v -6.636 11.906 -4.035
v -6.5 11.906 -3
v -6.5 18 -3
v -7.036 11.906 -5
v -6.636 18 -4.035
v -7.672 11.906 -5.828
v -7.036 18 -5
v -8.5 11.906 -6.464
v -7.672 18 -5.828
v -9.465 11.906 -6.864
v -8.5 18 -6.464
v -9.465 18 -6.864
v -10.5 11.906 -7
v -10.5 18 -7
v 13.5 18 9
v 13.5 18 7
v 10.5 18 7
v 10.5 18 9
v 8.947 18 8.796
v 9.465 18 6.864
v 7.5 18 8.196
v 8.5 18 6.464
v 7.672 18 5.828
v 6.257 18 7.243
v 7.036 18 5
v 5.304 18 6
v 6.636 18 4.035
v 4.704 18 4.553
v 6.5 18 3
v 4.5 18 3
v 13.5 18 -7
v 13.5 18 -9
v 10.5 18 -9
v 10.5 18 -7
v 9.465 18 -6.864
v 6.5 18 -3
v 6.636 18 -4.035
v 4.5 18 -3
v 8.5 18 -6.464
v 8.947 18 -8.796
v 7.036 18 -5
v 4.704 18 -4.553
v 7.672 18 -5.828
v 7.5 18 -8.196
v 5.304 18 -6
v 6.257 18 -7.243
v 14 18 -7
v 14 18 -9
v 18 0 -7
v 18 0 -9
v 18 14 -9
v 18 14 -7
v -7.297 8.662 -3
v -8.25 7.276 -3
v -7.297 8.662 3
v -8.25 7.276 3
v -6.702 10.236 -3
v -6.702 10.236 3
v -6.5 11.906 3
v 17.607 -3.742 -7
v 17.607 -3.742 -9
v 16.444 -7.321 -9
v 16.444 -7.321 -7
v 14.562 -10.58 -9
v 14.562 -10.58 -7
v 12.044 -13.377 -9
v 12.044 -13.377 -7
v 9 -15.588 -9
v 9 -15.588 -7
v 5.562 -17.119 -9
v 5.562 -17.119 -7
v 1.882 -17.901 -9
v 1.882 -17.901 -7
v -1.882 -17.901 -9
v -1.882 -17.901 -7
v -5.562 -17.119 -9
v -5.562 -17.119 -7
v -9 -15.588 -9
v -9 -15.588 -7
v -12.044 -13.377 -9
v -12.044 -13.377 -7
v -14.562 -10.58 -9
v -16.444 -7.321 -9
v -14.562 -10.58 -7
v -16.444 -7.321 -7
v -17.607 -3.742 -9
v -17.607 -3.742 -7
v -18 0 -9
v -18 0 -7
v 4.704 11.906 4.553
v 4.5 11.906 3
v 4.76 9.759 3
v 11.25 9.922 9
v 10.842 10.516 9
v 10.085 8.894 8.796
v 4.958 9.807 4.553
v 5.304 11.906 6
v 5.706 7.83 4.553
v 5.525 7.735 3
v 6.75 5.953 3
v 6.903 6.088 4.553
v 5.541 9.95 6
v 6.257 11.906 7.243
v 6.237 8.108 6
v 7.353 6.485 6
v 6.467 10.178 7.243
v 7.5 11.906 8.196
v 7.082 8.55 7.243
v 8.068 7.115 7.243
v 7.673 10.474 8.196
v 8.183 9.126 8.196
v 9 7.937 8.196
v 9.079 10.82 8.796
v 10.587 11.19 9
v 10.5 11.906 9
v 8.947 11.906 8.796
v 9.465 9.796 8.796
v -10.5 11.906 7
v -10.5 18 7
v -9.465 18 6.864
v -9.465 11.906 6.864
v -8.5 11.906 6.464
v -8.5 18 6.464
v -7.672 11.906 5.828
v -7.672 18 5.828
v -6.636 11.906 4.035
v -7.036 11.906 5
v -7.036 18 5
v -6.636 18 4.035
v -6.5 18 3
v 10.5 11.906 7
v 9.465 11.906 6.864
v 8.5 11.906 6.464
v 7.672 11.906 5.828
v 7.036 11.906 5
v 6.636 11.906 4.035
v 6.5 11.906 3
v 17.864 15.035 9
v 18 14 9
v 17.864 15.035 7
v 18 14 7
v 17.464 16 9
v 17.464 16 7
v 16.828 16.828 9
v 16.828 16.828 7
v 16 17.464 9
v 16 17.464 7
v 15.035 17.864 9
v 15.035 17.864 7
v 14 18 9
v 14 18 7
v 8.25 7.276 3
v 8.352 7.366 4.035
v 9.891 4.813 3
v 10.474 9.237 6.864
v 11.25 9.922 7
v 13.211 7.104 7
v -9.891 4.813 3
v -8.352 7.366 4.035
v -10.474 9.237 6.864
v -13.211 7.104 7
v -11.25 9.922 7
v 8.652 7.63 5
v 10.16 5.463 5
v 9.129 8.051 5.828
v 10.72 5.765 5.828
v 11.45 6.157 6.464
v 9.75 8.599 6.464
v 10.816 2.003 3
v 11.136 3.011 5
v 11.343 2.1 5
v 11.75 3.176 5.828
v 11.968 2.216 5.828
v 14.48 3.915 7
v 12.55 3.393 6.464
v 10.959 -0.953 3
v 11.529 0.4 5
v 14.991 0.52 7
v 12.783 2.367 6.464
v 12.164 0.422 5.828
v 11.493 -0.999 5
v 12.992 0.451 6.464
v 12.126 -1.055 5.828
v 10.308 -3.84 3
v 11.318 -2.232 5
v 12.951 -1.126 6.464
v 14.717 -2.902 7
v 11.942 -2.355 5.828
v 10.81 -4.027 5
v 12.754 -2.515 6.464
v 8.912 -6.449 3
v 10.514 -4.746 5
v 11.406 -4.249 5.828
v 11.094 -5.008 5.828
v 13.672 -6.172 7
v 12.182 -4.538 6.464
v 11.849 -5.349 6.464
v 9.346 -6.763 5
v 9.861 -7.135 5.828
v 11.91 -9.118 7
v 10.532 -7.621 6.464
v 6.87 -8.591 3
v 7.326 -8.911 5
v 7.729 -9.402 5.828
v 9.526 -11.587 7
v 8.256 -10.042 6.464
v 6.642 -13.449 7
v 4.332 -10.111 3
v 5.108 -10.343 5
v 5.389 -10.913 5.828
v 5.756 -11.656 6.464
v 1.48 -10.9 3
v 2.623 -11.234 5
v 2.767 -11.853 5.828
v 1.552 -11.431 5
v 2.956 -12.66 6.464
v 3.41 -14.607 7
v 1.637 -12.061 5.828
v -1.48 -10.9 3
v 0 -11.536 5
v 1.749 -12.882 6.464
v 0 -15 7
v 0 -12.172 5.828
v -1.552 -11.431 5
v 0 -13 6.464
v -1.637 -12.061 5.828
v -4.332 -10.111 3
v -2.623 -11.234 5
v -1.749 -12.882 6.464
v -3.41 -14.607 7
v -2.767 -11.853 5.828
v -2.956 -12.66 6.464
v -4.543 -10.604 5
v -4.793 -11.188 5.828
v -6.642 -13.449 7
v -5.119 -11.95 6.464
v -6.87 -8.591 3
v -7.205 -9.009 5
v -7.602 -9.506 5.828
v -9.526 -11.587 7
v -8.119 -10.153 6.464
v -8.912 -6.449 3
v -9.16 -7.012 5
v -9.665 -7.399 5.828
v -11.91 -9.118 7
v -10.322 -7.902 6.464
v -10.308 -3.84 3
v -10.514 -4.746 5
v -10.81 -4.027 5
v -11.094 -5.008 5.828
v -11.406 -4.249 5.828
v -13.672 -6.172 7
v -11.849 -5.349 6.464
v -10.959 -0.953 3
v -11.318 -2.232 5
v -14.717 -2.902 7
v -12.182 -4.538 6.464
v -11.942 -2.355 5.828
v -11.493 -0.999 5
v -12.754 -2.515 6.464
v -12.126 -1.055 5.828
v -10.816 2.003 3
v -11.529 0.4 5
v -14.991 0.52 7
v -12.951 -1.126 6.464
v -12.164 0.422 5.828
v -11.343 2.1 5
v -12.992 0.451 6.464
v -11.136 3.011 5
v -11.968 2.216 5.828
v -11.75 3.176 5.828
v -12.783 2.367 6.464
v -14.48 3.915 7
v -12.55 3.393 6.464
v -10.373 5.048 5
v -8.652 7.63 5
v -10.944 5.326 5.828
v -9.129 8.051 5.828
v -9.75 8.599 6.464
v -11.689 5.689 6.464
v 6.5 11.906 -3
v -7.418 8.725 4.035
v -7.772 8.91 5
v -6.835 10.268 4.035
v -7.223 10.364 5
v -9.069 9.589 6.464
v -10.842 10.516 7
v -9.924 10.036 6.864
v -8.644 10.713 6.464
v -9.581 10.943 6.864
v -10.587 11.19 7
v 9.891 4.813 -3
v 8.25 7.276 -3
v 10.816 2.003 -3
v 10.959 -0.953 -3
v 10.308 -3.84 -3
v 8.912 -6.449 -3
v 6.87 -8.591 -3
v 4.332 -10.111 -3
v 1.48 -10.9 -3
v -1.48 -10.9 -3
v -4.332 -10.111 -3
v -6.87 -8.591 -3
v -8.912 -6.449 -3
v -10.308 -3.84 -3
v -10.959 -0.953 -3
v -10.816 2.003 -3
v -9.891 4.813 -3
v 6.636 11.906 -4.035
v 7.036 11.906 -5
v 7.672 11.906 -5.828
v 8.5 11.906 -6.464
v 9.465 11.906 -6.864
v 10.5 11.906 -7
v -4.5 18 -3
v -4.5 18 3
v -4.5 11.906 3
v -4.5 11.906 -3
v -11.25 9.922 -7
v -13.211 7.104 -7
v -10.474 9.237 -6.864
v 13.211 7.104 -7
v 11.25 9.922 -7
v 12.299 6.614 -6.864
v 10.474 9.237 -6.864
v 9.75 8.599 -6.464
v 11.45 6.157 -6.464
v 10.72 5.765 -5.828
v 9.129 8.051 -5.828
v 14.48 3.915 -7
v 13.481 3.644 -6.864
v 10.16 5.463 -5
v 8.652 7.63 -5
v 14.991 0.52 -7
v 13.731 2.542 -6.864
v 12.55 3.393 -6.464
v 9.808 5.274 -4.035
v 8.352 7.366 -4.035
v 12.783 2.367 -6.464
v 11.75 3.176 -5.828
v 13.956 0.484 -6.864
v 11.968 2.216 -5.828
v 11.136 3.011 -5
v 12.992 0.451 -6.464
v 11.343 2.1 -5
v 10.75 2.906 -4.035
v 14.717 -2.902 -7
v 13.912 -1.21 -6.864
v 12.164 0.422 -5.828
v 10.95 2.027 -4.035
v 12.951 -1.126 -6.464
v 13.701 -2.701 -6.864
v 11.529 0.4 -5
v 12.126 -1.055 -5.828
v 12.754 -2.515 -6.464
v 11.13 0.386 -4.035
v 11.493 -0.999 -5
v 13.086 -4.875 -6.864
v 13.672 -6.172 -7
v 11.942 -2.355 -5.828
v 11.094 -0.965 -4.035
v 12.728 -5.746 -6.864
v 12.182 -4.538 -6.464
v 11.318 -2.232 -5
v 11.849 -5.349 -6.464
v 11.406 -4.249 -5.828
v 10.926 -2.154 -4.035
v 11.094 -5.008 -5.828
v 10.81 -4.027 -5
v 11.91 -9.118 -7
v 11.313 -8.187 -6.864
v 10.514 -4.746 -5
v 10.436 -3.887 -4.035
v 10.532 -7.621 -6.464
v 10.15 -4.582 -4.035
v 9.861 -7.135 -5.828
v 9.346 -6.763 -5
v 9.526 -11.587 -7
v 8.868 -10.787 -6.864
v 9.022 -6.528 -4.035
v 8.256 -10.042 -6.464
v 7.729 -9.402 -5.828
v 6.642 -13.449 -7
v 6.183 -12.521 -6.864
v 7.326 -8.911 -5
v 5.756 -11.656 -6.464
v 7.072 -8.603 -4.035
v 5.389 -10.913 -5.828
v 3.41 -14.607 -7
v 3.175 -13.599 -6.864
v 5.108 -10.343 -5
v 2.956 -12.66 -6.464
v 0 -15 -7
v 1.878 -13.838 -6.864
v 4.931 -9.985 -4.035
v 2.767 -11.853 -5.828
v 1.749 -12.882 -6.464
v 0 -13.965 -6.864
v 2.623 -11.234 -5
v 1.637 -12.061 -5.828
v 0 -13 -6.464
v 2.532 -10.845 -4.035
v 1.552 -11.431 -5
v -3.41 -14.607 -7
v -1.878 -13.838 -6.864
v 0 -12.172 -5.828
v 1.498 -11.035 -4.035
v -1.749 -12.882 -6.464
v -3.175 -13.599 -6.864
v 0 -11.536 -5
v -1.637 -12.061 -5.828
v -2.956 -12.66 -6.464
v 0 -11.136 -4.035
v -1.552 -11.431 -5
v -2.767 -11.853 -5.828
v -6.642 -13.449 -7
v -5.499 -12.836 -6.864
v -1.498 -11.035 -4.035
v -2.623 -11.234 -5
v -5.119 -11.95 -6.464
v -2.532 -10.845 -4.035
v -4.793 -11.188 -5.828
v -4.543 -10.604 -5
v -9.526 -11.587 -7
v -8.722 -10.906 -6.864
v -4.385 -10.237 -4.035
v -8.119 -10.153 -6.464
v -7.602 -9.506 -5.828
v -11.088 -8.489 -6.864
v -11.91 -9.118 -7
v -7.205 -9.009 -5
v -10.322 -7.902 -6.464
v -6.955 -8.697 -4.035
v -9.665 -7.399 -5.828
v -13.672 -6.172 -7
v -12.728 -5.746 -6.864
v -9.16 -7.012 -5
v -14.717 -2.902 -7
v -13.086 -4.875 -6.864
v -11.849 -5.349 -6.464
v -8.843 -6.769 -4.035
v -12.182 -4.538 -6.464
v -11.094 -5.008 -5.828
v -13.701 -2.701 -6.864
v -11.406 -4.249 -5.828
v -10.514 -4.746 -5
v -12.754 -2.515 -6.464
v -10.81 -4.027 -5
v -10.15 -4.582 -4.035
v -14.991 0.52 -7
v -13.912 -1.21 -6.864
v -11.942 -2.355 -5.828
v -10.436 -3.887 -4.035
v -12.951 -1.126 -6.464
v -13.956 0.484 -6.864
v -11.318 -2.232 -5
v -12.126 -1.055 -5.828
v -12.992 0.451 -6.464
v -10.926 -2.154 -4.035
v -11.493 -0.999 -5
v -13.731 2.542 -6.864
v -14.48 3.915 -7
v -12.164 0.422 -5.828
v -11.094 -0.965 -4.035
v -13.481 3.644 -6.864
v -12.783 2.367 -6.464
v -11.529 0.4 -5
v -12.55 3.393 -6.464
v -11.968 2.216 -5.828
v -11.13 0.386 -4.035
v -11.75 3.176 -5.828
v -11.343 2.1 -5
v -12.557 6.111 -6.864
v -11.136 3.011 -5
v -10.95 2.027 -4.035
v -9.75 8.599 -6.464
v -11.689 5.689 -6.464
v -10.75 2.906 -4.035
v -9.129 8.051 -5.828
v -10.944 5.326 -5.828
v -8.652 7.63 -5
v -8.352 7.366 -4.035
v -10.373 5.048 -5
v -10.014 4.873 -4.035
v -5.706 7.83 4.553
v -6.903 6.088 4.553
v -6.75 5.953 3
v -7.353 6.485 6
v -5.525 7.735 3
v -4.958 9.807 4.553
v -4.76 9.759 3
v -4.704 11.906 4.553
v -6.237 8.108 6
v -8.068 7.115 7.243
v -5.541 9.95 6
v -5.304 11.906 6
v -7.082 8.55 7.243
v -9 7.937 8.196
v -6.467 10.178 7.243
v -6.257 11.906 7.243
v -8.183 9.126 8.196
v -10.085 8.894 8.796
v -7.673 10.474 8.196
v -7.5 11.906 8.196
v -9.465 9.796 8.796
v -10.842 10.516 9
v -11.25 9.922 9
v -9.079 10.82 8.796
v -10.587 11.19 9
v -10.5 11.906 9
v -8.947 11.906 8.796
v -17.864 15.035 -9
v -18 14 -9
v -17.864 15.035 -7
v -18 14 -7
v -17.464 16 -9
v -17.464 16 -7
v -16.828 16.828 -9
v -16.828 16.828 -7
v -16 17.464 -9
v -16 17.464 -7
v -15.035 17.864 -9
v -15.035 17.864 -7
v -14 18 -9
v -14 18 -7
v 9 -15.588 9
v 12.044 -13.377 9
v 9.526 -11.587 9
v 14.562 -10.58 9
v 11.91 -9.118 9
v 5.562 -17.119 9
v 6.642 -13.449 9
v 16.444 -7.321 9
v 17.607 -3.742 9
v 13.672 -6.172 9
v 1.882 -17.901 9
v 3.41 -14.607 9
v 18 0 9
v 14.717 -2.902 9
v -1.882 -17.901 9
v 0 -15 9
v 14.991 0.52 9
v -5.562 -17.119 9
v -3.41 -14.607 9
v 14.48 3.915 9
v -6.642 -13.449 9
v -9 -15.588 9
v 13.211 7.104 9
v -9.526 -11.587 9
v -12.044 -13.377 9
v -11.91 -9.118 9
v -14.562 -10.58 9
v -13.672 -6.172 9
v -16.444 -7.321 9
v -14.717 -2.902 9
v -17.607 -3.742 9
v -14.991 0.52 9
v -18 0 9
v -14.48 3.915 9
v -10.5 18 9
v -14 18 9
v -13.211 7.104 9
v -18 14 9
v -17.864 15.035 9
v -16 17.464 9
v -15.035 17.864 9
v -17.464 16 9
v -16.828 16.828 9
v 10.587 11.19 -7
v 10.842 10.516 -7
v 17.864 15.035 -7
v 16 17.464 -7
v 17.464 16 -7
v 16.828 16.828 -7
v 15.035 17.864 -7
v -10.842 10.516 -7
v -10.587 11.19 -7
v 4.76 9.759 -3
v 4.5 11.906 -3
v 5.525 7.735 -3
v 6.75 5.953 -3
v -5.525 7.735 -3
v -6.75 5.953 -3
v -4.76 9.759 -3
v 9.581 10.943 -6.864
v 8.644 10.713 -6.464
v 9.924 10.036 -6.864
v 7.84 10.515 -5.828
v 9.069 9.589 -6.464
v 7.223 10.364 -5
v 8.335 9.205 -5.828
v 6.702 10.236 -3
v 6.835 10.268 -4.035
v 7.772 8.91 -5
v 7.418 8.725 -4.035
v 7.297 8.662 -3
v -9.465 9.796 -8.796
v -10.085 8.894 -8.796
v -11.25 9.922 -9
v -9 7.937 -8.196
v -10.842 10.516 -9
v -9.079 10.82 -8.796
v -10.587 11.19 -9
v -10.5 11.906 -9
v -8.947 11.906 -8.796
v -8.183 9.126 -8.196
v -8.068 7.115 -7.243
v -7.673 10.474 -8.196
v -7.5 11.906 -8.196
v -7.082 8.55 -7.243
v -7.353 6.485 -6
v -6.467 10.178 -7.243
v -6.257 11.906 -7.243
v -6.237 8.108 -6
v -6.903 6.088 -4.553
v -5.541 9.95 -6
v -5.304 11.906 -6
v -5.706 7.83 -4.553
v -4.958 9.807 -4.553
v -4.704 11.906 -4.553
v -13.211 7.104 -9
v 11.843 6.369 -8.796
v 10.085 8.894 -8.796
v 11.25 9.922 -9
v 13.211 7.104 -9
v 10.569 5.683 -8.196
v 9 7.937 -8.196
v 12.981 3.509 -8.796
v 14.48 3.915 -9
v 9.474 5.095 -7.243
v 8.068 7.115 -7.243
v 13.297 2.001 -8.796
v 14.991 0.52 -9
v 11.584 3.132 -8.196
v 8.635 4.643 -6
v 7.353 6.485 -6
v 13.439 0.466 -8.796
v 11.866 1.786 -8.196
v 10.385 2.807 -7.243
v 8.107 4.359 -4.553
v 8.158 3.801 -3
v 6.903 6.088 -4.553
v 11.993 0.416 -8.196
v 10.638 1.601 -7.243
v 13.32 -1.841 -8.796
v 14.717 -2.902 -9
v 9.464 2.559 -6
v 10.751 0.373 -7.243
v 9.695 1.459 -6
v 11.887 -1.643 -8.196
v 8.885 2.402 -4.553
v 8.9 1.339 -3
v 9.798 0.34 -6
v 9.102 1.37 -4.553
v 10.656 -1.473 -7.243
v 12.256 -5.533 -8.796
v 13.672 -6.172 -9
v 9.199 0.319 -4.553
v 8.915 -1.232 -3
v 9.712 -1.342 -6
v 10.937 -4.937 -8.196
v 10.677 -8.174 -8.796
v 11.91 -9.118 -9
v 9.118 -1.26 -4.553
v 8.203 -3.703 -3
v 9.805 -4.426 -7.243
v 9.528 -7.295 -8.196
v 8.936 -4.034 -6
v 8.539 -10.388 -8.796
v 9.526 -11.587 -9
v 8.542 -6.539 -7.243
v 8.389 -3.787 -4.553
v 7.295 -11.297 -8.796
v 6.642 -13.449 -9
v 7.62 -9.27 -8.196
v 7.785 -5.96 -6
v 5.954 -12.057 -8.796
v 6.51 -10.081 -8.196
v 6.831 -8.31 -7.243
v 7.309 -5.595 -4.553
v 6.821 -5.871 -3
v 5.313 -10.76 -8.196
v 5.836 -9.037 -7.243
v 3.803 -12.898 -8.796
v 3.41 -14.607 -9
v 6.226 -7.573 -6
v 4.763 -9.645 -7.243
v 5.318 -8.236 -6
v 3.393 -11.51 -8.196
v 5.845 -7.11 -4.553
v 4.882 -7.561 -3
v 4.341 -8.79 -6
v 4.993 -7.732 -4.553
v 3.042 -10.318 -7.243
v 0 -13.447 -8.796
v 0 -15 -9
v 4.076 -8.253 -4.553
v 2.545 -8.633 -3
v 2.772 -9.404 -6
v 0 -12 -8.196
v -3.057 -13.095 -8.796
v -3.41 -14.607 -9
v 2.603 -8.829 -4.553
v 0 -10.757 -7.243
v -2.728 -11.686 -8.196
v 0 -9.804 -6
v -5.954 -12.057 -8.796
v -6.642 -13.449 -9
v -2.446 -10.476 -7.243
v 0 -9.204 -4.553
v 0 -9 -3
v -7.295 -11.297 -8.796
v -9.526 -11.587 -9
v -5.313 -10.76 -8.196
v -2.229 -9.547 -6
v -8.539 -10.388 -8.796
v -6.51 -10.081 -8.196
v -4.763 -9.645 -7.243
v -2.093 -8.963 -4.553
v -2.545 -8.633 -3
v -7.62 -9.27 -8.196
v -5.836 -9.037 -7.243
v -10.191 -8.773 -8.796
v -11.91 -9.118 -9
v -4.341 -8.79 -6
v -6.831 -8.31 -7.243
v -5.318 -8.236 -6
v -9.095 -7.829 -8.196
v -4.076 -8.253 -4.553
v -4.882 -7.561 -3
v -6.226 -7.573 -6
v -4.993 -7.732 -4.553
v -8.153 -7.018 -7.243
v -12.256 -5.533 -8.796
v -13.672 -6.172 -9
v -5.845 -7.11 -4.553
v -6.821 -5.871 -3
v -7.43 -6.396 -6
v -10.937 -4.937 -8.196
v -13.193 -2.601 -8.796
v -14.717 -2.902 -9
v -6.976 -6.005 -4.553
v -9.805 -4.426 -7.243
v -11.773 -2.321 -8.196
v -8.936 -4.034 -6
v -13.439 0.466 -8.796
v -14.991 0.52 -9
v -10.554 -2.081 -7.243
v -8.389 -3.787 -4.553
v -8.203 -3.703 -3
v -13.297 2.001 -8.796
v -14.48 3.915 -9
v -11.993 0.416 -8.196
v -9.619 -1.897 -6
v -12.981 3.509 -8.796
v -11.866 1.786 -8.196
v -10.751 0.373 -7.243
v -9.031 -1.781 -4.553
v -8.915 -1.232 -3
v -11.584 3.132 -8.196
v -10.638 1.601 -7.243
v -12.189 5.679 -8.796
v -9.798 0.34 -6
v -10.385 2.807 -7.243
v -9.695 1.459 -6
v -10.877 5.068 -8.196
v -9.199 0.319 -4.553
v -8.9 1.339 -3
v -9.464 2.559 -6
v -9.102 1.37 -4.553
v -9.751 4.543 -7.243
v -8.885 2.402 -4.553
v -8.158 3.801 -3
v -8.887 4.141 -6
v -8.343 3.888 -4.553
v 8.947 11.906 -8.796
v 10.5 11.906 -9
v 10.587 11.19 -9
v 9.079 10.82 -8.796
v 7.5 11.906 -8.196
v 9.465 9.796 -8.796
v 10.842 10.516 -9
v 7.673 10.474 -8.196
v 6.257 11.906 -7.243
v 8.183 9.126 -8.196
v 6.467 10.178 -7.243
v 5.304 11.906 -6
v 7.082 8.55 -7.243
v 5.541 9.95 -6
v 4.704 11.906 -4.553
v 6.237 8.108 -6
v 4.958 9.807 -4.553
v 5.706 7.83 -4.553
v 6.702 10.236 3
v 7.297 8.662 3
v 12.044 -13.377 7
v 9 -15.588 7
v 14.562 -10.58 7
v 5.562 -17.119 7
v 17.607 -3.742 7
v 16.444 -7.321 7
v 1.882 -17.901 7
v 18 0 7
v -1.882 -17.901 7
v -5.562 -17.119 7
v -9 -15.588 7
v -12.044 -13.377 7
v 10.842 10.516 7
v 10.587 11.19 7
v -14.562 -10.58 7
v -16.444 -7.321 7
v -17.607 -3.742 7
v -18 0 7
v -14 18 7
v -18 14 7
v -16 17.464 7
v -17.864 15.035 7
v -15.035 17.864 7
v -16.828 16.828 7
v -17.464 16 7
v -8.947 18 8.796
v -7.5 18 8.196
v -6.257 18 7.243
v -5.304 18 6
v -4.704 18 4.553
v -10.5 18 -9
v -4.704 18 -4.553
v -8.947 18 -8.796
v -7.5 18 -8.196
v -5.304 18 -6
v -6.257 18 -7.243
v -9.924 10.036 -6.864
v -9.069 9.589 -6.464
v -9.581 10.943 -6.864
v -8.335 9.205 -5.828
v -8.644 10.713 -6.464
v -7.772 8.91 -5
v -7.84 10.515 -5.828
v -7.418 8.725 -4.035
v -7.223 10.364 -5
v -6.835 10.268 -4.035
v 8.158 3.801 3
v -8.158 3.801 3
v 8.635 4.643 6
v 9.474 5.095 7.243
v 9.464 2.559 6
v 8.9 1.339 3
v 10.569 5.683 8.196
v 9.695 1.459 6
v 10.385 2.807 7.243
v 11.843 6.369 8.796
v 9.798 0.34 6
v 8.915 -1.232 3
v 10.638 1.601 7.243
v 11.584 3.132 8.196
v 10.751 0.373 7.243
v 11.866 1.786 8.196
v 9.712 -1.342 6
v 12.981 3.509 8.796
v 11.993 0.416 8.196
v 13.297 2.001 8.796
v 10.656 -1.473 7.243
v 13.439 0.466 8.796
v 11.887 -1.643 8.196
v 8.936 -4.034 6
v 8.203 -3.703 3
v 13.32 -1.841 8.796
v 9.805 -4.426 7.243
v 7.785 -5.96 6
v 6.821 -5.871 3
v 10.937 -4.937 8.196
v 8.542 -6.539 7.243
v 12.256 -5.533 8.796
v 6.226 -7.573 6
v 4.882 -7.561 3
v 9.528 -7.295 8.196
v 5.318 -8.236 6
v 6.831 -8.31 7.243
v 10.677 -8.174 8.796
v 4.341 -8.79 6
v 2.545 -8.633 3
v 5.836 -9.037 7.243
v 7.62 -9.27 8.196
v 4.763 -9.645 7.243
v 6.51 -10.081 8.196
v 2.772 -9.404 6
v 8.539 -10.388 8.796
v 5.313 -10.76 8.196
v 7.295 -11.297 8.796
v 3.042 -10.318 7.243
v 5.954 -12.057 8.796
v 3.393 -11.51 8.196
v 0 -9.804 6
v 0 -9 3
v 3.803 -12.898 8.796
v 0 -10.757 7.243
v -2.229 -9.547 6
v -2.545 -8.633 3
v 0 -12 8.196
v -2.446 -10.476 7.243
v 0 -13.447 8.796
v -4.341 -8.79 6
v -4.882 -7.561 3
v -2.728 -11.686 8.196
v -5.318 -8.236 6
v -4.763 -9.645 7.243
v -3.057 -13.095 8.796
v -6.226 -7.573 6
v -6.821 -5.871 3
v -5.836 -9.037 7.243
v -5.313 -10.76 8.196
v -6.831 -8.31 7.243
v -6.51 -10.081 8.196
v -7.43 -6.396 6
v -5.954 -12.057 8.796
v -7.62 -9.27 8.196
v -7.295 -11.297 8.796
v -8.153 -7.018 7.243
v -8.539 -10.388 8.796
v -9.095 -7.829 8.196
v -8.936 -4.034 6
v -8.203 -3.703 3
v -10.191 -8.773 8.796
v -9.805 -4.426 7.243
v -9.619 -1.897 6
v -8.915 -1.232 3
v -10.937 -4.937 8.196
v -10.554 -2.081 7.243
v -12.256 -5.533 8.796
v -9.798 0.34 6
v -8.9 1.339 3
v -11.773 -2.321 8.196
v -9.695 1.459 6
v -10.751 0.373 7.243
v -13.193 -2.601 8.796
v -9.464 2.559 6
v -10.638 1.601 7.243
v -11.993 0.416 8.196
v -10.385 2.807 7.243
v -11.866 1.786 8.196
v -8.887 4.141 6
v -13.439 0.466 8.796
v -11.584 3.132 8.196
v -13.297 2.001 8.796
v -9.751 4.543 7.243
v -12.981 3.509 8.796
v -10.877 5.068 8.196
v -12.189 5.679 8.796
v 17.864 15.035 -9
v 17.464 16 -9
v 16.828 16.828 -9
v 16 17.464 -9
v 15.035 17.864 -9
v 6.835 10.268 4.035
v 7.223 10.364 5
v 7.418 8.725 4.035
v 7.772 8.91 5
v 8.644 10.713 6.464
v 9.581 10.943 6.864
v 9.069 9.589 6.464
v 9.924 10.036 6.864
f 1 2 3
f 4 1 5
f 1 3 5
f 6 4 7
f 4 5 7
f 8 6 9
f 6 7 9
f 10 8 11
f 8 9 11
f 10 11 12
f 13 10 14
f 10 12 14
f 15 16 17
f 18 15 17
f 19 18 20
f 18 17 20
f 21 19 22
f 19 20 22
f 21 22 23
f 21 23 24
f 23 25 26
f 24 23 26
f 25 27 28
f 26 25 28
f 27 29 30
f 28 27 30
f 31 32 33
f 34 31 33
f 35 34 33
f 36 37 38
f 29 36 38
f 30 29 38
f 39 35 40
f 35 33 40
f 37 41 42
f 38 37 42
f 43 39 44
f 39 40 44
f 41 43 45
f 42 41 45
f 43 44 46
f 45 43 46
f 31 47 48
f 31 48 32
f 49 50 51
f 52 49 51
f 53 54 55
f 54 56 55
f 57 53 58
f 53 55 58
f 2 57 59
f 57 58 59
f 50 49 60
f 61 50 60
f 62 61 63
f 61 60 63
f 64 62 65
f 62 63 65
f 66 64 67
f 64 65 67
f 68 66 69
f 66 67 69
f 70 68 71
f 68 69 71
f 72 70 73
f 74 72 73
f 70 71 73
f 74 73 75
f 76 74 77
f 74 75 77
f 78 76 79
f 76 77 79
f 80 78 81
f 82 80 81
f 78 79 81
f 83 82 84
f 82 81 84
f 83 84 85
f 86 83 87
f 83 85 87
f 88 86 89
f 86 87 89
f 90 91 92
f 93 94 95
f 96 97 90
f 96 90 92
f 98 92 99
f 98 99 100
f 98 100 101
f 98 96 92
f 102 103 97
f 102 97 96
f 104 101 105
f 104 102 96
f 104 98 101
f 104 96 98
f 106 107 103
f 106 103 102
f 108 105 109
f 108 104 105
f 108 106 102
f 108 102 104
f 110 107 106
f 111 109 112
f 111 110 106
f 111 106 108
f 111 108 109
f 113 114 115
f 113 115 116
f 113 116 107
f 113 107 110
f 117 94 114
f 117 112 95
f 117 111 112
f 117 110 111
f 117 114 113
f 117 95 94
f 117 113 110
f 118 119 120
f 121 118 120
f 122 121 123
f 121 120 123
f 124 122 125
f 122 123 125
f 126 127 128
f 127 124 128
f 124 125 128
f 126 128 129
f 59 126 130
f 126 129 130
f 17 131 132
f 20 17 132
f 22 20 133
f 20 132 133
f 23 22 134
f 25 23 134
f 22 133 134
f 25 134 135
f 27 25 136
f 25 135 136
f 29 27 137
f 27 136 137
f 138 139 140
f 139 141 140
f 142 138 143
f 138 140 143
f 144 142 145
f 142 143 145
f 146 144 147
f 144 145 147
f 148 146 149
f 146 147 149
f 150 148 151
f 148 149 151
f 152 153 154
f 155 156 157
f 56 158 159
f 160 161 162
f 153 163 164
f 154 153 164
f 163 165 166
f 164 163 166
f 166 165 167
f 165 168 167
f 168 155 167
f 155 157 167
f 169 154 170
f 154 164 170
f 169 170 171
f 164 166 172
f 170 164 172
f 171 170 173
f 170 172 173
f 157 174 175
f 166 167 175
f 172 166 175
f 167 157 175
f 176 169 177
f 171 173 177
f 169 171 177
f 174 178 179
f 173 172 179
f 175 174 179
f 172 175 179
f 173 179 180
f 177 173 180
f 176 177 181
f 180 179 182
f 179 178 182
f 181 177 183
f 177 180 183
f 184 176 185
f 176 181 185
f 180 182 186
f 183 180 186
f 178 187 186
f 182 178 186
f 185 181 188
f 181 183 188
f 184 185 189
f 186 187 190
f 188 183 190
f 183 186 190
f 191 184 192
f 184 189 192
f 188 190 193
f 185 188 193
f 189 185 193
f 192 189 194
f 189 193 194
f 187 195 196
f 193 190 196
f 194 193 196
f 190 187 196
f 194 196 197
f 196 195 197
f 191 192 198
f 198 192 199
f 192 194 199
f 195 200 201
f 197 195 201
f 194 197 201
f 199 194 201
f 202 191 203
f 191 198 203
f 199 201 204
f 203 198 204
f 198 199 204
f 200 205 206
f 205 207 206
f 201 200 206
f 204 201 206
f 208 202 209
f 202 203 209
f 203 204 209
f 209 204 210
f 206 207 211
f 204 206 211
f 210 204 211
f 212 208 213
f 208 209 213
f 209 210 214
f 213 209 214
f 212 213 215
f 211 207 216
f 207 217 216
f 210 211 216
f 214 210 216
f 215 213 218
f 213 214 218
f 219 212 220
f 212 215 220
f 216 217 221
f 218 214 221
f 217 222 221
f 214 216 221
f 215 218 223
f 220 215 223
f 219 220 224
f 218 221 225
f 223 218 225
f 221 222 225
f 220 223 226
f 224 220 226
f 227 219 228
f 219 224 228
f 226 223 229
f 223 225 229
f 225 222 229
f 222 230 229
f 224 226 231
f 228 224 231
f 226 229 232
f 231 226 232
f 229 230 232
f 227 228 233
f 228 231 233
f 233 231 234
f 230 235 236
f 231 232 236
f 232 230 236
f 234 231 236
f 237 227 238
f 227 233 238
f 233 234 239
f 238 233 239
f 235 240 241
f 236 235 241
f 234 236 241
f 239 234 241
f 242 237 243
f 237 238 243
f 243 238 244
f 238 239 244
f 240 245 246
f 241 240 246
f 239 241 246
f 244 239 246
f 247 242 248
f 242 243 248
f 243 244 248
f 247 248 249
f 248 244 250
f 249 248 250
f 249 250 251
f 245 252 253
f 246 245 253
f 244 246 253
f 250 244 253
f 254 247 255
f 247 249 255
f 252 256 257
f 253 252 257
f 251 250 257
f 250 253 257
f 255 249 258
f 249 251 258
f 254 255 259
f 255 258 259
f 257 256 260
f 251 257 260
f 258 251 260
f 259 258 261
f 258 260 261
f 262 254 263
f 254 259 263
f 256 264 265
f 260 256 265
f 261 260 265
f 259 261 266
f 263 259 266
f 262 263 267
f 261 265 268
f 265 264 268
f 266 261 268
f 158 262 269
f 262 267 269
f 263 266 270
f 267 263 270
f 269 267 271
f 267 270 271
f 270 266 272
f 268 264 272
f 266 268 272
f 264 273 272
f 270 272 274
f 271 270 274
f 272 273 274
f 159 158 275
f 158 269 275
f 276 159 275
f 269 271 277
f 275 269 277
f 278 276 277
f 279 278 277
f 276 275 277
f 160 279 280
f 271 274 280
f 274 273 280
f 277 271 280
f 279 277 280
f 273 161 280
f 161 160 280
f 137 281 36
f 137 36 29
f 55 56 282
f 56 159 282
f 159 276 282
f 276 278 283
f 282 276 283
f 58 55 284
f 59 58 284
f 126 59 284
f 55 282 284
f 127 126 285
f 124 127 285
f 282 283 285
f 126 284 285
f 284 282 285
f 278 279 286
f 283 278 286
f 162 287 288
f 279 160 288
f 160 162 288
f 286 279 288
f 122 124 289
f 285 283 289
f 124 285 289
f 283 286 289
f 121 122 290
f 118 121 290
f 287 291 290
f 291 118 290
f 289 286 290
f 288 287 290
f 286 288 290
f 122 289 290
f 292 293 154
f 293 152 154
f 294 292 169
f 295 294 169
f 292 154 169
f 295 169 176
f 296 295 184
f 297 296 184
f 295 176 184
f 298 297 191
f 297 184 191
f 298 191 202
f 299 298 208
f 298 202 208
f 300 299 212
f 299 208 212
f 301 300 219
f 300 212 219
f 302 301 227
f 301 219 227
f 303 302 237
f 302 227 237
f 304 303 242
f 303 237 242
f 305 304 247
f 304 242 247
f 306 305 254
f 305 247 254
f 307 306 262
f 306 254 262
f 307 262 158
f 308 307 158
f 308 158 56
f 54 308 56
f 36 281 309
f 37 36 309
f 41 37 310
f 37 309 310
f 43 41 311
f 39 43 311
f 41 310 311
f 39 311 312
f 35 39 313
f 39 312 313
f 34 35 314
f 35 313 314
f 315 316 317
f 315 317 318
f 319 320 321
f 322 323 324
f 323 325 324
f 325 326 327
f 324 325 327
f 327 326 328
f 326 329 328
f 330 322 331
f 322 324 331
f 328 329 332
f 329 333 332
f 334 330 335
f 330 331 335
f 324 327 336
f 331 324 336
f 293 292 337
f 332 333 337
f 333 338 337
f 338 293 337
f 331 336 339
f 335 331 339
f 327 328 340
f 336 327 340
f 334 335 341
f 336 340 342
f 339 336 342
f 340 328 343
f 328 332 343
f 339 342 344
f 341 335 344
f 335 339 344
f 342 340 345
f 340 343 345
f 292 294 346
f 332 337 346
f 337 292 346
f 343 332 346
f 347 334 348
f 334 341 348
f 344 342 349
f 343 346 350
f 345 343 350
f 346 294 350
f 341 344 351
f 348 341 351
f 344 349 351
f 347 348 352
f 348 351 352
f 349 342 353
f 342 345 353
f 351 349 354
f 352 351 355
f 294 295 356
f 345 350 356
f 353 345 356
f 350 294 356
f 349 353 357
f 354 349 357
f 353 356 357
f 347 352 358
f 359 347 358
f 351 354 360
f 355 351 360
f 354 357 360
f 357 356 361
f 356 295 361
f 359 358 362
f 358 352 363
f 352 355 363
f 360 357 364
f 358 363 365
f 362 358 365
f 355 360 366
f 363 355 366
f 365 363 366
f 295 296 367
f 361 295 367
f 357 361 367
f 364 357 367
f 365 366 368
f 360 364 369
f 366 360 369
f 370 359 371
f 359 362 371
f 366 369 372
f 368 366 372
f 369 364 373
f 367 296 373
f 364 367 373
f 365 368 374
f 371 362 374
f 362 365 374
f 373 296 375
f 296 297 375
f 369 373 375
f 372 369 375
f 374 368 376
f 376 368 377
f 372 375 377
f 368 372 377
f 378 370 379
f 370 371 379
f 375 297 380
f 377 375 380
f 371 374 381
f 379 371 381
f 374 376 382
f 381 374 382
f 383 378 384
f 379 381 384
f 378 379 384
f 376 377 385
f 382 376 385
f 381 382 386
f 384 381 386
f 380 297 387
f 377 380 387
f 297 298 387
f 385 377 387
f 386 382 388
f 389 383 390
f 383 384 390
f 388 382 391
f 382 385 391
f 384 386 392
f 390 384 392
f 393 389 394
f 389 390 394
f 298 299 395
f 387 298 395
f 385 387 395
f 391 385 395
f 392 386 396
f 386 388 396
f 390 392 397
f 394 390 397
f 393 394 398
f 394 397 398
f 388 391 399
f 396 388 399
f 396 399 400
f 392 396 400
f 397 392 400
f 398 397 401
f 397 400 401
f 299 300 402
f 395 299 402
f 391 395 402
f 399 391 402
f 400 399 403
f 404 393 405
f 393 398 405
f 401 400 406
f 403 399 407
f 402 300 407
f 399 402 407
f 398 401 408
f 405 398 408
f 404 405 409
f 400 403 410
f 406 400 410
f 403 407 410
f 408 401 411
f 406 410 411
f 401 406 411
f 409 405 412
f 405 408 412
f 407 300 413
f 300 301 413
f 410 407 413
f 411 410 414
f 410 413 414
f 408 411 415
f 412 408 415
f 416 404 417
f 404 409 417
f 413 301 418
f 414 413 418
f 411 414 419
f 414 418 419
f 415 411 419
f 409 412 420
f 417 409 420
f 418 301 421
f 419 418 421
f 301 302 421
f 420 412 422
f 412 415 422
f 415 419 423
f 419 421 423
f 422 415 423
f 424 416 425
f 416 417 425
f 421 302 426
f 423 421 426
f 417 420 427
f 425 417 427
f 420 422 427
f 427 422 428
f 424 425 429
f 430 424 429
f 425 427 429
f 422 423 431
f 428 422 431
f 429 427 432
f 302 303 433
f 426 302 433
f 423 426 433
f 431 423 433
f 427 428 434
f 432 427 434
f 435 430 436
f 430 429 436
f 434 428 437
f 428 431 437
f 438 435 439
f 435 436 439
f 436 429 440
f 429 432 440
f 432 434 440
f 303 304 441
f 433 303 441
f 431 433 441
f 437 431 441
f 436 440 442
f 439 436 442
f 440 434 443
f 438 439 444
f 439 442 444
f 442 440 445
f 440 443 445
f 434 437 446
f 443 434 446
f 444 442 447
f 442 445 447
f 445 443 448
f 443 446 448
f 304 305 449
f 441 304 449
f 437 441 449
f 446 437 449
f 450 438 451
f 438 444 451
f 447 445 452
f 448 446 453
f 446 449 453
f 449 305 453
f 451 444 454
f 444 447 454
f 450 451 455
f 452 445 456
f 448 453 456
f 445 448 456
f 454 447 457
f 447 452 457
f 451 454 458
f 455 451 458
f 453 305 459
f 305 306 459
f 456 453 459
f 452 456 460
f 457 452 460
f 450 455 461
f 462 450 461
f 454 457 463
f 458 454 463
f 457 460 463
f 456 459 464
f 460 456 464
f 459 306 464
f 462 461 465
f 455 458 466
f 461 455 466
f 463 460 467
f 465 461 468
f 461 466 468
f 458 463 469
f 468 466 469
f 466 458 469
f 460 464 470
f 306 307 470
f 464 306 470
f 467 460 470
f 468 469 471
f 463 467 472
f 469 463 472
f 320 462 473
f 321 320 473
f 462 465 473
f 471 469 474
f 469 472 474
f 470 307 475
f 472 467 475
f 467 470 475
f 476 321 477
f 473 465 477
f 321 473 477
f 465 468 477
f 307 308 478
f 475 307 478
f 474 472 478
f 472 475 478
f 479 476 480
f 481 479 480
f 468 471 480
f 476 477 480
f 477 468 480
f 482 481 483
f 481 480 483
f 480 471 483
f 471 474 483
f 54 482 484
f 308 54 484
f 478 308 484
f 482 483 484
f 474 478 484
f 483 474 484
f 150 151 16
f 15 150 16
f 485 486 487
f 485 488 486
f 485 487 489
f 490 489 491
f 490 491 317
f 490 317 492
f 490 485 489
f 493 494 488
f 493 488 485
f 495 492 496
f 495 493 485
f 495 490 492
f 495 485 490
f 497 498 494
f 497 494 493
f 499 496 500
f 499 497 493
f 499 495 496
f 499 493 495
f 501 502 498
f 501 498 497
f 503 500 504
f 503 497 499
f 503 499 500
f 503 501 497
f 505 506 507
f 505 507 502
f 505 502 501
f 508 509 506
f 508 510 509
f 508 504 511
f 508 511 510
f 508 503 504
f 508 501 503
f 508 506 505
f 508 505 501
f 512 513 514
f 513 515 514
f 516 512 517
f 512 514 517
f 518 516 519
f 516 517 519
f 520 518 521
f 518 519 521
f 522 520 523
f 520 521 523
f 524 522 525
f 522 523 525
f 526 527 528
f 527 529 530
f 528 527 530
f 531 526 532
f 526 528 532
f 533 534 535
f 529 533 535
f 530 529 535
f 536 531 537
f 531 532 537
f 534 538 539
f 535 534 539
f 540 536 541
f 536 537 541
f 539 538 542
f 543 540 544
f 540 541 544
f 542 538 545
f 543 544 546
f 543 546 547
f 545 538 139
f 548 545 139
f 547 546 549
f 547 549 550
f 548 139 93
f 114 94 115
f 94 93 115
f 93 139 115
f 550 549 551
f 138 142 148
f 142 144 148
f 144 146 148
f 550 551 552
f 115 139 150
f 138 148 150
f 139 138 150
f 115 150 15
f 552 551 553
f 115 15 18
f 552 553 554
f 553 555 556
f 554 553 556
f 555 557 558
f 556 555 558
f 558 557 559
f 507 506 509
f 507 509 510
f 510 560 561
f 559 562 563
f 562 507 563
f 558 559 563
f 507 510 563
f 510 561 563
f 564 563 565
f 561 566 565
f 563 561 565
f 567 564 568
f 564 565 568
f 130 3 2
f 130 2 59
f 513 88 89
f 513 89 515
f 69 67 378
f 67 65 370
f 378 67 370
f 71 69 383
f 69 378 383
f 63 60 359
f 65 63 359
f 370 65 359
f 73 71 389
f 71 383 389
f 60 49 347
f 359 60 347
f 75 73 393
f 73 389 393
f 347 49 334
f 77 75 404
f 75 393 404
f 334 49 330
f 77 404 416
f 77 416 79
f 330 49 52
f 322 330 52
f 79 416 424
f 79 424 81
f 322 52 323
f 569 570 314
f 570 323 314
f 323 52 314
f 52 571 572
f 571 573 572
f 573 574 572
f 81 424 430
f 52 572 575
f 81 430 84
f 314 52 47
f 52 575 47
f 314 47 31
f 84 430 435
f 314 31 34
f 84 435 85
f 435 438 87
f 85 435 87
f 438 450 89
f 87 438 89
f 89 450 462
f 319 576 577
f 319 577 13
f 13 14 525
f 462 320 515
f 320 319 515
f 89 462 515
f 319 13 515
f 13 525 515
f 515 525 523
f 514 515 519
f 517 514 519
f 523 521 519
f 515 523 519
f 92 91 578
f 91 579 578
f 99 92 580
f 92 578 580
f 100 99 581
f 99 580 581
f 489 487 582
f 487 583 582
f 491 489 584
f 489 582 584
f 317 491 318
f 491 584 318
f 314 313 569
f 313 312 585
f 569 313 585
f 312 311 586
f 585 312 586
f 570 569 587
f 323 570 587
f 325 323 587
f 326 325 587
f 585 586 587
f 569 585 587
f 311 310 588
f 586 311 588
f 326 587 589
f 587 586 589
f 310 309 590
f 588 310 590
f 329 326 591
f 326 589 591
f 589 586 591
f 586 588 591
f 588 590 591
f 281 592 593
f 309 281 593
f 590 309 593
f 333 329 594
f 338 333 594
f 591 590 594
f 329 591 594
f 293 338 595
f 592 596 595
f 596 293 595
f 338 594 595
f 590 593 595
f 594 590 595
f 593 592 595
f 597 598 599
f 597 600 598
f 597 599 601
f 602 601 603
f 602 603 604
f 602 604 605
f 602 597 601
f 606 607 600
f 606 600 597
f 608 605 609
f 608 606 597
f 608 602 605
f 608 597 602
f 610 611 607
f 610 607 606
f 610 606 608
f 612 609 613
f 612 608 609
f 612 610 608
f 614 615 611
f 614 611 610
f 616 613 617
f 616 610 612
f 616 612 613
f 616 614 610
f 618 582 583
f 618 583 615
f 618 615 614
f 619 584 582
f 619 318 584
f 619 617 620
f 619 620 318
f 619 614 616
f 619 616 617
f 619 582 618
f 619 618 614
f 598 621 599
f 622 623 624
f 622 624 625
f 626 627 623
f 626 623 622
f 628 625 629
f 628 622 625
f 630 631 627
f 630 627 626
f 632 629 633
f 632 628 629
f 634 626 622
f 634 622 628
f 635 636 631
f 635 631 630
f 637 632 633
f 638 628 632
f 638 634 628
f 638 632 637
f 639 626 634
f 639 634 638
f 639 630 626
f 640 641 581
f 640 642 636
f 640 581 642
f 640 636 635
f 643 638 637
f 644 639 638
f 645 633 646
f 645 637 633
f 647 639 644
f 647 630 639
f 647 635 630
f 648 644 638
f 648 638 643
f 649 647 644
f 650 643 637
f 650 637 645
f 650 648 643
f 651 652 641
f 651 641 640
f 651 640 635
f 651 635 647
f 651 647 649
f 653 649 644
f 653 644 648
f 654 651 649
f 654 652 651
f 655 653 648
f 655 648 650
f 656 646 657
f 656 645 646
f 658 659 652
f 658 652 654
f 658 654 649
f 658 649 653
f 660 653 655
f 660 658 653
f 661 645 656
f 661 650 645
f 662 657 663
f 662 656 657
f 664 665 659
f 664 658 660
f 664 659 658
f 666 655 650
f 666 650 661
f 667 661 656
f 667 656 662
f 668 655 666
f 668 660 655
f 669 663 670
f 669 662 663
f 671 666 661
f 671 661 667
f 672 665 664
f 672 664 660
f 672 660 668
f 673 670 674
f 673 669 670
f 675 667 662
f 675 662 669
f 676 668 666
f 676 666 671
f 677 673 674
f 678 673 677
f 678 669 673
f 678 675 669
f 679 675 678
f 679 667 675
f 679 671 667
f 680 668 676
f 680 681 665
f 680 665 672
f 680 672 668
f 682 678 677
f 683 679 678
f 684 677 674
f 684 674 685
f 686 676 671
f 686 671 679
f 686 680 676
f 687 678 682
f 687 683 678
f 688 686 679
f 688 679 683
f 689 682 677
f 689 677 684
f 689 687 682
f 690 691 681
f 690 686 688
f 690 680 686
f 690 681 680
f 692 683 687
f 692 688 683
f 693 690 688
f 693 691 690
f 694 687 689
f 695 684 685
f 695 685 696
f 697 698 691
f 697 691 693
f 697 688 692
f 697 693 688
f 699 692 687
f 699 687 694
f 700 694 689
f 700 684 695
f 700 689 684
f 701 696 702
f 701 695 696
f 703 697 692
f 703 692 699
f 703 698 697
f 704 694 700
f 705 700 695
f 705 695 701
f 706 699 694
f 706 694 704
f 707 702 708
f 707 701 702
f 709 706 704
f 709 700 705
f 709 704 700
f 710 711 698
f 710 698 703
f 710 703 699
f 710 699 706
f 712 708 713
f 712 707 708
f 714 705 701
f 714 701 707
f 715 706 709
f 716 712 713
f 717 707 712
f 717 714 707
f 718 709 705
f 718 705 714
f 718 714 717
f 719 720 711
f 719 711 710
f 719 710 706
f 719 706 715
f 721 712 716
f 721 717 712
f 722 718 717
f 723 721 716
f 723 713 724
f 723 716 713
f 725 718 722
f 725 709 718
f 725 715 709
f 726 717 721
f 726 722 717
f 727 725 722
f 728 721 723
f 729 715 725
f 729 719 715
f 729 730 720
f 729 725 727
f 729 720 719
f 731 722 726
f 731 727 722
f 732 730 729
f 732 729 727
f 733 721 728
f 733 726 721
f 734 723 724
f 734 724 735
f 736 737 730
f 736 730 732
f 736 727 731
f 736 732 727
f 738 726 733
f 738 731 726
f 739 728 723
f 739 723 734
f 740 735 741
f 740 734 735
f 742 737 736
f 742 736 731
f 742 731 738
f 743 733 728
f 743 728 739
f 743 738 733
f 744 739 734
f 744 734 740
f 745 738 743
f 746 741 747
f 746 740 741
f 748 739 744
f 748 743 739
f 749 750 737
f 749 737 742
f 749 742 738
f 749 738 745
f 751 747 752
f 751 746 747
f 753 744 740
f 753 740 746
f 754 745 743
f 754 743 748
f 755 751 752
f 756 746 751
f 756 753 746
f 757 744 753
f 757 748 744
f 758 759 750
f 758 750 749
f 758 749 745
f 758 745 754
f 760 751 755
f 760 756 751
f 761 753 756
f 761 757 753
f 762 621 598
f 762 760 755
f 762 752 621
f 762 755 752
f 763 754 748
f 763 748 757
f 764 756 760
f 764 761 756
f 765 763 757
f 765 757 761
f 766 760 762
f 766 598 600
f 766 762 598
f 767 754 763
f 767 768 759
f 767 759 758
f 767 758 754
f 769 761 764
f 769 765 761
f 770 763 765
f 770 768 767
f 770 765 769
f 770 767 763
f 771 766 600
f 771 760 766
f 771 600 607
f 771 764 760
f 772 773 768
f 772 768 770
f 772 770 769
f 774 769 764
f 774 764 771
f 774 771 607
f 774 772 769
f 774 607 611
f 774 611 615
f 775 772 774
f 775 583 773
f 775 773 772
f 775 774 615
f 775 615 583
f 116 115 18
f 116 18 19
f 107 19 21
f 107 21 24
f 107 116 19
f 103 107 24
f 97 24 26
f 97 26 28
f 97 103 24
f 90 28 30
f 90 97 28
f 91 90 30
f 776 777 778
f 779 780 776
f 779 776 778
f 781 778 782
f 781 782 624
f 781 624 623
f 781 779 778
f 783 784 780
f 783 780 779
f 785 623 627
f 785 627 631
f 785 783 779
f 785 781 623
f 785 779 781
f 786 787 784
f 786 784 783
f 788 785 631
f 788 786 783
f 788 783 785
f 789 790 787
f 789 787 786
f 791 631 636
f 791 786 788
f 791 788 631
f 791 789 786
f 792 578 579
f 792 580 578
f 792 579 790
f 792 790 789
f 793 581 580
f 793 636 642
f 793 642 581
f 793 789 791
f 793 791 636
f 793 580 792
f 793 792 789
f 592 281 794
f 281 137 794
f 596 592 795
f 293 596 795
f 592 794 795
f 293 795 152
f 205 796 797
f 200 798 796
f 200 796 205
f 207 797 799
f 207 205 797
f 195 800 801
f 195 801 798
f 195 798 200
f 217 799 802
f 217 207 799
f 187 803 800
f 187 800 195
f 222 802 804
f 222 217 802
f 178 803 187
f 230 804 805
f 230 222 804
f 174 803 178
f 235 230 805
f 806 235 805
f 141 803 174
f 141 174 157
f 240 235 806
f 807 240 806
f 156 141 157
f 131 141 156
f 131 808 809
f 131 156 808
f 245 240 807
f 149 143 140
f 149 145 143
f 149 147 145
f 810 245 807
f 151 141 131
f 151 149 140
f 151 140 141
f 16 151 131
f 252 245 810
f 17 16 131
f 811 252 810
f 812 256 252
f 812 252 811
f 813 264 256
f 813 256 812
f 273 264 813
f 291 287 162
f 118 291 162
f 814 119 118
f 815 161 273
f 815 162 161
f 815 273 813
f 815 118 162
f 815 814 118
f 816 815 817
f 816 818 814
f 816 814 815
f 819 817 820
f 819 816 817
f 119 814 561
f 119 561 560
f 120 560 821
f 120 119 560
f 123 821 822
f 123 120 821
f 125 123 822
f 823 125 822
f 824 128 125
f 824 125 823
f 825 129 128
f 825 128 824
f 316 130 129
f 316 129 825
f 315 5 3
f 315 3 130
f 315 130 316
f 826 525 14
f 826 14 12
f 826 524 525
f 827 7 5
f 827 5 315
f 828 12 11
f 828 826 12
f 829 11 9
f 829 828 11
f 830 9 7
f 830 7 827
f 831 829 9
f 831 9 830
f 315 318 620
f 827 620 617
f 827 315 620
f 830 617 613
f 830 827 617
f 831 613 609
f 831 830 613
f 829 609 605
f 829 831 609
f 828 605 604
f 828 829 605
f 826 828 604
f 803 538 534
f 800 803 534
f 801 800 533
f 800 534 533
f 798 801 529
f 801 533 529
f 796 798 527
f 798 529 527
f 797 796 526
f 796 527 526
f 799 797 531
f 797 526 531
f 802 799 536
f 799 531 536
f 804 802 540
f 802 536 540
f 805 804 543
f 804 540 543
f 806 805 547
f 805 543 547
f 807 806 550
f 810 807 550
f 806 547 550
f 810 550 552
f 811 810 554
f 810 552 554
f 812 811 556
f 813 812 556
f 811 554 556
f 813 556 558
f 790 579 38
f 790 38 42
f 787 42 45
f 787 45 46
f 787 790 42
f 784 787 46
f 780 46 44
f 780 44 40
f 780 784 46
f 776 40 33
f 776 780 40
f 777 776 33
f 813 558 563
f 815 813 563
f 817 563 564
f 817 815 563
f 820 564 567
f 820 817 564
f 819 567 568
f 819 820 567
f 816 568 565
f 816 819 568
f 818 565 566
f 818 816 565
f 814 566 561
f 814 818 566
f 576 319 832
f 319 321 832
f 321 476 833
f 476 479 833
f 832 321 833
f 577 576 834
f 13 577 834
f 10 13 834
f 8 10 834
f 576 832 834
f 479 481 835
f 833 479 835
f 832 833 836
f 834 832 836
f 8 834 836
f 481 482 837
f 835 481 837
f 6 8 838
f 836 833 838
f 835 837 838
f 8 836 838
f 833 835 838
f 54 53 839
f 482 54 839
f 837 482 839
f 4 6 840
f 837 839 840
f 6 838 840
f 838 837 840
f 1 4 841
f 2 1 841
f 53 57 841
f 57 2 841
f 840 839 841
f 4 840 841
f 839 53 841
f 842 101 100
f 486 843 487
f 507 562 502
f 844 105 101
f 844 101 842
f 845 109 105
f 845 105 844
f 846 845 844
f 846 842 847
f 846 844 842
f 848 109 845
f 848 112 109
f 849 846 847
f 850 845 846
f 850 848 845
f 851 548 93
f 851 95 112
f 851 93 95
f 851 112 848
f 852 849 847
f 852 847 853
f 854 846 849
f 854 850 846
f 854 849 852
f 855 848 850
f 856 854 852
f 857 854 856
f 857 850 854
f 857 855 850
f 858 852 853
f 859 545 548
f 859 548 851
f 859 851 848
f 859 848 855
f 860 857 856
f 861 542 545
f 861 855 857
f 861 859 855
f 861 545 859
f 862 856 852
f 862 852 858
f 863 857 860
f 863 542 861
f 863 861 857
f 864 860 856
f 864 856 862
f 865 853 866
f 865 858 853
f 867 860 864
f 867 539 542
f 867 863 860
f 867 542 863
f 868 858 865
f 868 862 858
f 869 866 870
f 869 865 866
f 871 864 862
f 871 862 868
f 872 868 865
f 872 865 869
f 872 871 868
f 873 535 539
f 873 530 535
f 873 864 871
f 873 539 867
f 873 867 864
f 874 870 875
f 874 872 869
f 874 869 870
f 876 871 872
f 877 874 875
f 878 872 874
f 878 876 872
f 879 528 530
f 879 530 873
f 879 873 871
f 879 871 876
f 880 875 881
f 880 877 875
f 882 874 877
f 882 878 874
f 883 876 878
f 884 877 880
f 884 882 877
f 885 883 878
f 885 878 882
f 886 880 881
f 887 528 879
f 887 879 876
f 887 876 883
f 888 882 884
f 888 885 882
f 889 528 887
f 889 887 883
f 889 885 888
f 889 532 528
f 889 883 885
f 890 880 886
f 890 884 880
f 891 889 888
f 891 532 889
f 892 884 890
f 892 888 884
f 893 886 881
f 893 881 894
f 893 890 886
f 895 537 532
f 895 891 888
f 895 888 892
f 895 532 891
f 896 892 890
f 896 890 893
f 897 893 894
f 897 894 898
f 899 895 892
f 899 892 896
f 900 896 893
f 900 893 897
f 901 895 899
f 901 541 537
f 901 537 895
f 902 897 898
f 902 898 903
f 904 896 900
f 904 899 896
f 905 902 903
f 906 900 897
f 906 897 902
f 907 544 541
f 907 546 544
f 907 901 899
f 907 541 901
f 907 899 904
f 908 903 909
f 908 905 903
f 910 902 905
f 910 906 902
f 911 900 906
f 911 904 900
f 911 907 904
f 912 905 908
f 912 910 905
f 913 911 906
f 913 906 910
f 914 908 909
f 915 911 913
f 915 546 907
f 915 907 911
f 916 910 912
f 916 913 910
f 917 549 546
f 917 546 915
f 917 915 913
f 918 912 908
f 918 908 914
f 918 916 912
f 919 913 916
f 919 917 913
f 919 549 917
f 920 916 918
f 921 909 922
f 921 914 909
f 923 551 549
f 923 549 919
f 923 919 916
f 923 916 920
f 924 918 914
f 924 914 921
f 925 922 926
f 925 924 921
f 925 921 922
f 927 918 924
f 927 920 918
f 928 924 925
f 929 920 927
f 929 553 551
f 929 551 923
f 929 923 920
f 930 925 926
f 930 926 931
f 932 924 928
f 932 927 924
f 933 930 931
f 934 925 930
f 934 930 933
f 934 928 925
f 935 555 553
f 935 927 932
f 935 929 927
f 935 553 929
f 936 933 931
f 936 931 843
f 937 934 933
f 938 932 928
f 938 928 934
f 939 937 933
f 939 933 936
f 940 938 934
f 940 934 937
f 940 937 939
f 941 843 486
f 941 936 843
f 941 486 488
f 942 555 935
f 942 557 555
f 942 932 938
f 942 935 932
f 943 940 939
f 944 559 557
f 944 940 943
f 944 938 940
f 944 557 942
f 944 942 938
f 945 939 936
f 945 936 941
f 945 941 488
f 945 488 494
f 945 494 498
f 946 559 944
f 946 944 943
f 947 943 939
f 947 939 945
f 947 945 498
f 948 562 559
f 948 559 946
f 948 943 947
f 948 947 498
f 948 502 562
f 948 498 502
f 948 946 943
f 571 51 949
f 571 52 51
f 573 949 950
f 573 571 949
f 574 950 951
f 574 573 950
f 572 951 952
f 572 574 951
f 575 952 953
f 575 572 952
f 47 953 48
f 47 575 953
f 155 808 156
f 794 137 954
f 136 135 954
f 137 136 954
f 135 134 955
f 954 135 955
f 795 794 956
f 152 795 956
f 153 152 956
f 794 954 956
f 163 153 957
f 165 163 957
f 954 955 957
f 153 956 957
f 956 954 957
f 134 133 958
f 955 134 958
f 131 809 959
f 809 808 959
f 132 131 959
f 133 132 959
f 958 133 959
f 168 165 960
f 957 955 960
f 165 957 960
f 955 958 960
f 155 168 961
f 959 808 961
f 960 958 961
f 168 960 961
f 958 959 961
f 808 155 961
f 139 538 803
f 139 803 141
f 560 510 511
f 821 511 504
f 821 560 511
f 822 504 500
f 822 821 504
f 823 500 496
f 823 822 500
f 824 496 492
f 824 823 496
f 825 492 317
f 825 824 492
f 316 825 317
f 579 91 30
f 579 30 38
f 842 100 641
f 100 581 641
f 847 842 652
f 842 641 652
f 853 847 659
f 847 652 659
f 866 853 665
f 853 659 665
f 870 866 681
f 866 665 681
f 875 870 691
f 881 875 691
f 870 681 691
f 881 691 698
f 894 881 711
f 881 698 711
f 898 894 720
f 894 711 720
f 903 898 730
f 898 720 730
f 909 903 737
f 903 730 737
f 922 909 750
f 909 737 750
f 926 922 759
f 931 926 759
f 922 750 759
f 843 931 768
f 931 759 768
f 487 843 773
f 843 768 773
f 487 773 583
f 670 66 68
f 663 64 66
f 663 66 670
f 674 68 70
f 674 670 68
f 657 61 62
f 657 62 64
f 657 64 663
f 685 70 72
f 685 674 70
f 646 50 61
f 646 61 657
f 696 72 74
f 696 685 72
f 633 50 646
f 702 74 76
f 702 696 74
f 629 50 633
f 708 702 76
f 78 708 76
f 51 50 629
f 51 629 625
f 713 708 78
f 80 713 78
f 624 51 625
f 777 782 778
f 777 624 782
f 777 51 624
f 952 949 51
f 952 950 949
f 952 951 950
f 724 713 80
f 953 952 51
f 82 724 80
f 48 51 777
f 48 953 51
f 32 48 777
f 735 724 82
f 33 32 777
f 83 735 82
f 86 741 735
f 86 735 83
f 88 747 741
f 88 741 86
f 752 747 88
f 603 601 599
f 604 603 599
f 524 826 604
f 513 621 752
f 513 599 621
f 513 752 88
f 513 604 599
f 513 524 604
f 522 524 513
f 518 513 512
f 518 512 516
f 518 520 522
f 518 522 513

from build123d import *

# Parameters (mm, degrees)
BOSS_EXTRUDE1_DEPTH = 2
FILLET1_R           = 4


with BuildPart() as part:
    # Sweep3: sweep along a path in Sketch1
    with BuildLine(Plane.XY) as sweep3_path:
        Line((4.5, 18), (4.5, 11.9058809))
        ThreePointArc((4.5, 11.9058809), (5.08127088, 8.723900384), (6.75, 5.95294045))
        ThreePointArc((6.75, 5.95294045), (0, -9), (-6.75, 5.95294045))
        ThreePointArc((-6.75, 5.95294045), (-5.08127088, 8.723900384), (-4.5, 11.9058809))
        Line((-4.5, 11.9058809), (-4.5, 18))
    # Sketch2 → Sweep3 (sweep)
    with BuildSketch(Plane(origin=(-4.5, 18, 0), x_dir=(1, 0, 0), z_dir=(0, 1, 0))):
        with BuildLine():
            Line((0, 3), (0, -3))
            ThreePointArc((0, -3), (-1.757359313, -7.242640687), (-6, -9))
            Line((-6, -9), (-9, -9))
            Line((-9, -9), (-9, -7))
            Line((-9, -7), (-6, -7))
            ThreePointArc((-6, -7), (-3.171572875, -5.828427125), (-2, -3))
            Line((-2, -3), (-2, 3))
            ThreePointArc((-2, 3), (-3.171572875, 5.828427125), (-6, 7))
            Line((-6, 7), (-9, 7))
            Line((-9, 7), (-9, 9))
            Line((-9, 9), (-6, 9))
            ThreePointArc((-6, 9), (-1.757359313, 7.242640687), (0, 3))
        make_face()
    sweep(path=sweep3_path.line)

    # Sketch3 → Boss-Extrude1 (add)
    with BuildSketch(Plane.XY.offset(9)):
        with BuildLine():
            ThreePointArc((-13.5, 11.9058809), (-16.83745824, 6.363961031), (-18, 0))
            Line((-18, 0), (-18, 18))
            Line((-18, 18), (-13.5, 18))
            Line((-13.5, 18), (-13.5, 11.9058809))
        make_face()
        with BuildLine():
            Line((13.5, 18), (13.5, 11.9058809))
            ThreePointArc((13.5, 11.9058809), (16.83745824, 6.363961031), (18, 0))
            Line((18, 0), (18, 18))
            Line((18, 18), (13.5, 18))
        make_face()
    boss_extrude1 = extrude(amount=-BOSS_EXTRUDE1_DEPTH)

    # Mirror2: Boss-Extrude1 across plane
    add(boss_extrude1.mirror(Plane.XY))

    # Fillet1
    fillet1_edges = [part.edges().sort_by_distance(p)[0] for p in [
        (-18, 18, 8),
        (18, 18, 8),
        (-18, 18, -8),
        (18, 18, -8),
    ]]
    fillet(fillet1_edges, radius=FILLET1_R)


solid = part.part
